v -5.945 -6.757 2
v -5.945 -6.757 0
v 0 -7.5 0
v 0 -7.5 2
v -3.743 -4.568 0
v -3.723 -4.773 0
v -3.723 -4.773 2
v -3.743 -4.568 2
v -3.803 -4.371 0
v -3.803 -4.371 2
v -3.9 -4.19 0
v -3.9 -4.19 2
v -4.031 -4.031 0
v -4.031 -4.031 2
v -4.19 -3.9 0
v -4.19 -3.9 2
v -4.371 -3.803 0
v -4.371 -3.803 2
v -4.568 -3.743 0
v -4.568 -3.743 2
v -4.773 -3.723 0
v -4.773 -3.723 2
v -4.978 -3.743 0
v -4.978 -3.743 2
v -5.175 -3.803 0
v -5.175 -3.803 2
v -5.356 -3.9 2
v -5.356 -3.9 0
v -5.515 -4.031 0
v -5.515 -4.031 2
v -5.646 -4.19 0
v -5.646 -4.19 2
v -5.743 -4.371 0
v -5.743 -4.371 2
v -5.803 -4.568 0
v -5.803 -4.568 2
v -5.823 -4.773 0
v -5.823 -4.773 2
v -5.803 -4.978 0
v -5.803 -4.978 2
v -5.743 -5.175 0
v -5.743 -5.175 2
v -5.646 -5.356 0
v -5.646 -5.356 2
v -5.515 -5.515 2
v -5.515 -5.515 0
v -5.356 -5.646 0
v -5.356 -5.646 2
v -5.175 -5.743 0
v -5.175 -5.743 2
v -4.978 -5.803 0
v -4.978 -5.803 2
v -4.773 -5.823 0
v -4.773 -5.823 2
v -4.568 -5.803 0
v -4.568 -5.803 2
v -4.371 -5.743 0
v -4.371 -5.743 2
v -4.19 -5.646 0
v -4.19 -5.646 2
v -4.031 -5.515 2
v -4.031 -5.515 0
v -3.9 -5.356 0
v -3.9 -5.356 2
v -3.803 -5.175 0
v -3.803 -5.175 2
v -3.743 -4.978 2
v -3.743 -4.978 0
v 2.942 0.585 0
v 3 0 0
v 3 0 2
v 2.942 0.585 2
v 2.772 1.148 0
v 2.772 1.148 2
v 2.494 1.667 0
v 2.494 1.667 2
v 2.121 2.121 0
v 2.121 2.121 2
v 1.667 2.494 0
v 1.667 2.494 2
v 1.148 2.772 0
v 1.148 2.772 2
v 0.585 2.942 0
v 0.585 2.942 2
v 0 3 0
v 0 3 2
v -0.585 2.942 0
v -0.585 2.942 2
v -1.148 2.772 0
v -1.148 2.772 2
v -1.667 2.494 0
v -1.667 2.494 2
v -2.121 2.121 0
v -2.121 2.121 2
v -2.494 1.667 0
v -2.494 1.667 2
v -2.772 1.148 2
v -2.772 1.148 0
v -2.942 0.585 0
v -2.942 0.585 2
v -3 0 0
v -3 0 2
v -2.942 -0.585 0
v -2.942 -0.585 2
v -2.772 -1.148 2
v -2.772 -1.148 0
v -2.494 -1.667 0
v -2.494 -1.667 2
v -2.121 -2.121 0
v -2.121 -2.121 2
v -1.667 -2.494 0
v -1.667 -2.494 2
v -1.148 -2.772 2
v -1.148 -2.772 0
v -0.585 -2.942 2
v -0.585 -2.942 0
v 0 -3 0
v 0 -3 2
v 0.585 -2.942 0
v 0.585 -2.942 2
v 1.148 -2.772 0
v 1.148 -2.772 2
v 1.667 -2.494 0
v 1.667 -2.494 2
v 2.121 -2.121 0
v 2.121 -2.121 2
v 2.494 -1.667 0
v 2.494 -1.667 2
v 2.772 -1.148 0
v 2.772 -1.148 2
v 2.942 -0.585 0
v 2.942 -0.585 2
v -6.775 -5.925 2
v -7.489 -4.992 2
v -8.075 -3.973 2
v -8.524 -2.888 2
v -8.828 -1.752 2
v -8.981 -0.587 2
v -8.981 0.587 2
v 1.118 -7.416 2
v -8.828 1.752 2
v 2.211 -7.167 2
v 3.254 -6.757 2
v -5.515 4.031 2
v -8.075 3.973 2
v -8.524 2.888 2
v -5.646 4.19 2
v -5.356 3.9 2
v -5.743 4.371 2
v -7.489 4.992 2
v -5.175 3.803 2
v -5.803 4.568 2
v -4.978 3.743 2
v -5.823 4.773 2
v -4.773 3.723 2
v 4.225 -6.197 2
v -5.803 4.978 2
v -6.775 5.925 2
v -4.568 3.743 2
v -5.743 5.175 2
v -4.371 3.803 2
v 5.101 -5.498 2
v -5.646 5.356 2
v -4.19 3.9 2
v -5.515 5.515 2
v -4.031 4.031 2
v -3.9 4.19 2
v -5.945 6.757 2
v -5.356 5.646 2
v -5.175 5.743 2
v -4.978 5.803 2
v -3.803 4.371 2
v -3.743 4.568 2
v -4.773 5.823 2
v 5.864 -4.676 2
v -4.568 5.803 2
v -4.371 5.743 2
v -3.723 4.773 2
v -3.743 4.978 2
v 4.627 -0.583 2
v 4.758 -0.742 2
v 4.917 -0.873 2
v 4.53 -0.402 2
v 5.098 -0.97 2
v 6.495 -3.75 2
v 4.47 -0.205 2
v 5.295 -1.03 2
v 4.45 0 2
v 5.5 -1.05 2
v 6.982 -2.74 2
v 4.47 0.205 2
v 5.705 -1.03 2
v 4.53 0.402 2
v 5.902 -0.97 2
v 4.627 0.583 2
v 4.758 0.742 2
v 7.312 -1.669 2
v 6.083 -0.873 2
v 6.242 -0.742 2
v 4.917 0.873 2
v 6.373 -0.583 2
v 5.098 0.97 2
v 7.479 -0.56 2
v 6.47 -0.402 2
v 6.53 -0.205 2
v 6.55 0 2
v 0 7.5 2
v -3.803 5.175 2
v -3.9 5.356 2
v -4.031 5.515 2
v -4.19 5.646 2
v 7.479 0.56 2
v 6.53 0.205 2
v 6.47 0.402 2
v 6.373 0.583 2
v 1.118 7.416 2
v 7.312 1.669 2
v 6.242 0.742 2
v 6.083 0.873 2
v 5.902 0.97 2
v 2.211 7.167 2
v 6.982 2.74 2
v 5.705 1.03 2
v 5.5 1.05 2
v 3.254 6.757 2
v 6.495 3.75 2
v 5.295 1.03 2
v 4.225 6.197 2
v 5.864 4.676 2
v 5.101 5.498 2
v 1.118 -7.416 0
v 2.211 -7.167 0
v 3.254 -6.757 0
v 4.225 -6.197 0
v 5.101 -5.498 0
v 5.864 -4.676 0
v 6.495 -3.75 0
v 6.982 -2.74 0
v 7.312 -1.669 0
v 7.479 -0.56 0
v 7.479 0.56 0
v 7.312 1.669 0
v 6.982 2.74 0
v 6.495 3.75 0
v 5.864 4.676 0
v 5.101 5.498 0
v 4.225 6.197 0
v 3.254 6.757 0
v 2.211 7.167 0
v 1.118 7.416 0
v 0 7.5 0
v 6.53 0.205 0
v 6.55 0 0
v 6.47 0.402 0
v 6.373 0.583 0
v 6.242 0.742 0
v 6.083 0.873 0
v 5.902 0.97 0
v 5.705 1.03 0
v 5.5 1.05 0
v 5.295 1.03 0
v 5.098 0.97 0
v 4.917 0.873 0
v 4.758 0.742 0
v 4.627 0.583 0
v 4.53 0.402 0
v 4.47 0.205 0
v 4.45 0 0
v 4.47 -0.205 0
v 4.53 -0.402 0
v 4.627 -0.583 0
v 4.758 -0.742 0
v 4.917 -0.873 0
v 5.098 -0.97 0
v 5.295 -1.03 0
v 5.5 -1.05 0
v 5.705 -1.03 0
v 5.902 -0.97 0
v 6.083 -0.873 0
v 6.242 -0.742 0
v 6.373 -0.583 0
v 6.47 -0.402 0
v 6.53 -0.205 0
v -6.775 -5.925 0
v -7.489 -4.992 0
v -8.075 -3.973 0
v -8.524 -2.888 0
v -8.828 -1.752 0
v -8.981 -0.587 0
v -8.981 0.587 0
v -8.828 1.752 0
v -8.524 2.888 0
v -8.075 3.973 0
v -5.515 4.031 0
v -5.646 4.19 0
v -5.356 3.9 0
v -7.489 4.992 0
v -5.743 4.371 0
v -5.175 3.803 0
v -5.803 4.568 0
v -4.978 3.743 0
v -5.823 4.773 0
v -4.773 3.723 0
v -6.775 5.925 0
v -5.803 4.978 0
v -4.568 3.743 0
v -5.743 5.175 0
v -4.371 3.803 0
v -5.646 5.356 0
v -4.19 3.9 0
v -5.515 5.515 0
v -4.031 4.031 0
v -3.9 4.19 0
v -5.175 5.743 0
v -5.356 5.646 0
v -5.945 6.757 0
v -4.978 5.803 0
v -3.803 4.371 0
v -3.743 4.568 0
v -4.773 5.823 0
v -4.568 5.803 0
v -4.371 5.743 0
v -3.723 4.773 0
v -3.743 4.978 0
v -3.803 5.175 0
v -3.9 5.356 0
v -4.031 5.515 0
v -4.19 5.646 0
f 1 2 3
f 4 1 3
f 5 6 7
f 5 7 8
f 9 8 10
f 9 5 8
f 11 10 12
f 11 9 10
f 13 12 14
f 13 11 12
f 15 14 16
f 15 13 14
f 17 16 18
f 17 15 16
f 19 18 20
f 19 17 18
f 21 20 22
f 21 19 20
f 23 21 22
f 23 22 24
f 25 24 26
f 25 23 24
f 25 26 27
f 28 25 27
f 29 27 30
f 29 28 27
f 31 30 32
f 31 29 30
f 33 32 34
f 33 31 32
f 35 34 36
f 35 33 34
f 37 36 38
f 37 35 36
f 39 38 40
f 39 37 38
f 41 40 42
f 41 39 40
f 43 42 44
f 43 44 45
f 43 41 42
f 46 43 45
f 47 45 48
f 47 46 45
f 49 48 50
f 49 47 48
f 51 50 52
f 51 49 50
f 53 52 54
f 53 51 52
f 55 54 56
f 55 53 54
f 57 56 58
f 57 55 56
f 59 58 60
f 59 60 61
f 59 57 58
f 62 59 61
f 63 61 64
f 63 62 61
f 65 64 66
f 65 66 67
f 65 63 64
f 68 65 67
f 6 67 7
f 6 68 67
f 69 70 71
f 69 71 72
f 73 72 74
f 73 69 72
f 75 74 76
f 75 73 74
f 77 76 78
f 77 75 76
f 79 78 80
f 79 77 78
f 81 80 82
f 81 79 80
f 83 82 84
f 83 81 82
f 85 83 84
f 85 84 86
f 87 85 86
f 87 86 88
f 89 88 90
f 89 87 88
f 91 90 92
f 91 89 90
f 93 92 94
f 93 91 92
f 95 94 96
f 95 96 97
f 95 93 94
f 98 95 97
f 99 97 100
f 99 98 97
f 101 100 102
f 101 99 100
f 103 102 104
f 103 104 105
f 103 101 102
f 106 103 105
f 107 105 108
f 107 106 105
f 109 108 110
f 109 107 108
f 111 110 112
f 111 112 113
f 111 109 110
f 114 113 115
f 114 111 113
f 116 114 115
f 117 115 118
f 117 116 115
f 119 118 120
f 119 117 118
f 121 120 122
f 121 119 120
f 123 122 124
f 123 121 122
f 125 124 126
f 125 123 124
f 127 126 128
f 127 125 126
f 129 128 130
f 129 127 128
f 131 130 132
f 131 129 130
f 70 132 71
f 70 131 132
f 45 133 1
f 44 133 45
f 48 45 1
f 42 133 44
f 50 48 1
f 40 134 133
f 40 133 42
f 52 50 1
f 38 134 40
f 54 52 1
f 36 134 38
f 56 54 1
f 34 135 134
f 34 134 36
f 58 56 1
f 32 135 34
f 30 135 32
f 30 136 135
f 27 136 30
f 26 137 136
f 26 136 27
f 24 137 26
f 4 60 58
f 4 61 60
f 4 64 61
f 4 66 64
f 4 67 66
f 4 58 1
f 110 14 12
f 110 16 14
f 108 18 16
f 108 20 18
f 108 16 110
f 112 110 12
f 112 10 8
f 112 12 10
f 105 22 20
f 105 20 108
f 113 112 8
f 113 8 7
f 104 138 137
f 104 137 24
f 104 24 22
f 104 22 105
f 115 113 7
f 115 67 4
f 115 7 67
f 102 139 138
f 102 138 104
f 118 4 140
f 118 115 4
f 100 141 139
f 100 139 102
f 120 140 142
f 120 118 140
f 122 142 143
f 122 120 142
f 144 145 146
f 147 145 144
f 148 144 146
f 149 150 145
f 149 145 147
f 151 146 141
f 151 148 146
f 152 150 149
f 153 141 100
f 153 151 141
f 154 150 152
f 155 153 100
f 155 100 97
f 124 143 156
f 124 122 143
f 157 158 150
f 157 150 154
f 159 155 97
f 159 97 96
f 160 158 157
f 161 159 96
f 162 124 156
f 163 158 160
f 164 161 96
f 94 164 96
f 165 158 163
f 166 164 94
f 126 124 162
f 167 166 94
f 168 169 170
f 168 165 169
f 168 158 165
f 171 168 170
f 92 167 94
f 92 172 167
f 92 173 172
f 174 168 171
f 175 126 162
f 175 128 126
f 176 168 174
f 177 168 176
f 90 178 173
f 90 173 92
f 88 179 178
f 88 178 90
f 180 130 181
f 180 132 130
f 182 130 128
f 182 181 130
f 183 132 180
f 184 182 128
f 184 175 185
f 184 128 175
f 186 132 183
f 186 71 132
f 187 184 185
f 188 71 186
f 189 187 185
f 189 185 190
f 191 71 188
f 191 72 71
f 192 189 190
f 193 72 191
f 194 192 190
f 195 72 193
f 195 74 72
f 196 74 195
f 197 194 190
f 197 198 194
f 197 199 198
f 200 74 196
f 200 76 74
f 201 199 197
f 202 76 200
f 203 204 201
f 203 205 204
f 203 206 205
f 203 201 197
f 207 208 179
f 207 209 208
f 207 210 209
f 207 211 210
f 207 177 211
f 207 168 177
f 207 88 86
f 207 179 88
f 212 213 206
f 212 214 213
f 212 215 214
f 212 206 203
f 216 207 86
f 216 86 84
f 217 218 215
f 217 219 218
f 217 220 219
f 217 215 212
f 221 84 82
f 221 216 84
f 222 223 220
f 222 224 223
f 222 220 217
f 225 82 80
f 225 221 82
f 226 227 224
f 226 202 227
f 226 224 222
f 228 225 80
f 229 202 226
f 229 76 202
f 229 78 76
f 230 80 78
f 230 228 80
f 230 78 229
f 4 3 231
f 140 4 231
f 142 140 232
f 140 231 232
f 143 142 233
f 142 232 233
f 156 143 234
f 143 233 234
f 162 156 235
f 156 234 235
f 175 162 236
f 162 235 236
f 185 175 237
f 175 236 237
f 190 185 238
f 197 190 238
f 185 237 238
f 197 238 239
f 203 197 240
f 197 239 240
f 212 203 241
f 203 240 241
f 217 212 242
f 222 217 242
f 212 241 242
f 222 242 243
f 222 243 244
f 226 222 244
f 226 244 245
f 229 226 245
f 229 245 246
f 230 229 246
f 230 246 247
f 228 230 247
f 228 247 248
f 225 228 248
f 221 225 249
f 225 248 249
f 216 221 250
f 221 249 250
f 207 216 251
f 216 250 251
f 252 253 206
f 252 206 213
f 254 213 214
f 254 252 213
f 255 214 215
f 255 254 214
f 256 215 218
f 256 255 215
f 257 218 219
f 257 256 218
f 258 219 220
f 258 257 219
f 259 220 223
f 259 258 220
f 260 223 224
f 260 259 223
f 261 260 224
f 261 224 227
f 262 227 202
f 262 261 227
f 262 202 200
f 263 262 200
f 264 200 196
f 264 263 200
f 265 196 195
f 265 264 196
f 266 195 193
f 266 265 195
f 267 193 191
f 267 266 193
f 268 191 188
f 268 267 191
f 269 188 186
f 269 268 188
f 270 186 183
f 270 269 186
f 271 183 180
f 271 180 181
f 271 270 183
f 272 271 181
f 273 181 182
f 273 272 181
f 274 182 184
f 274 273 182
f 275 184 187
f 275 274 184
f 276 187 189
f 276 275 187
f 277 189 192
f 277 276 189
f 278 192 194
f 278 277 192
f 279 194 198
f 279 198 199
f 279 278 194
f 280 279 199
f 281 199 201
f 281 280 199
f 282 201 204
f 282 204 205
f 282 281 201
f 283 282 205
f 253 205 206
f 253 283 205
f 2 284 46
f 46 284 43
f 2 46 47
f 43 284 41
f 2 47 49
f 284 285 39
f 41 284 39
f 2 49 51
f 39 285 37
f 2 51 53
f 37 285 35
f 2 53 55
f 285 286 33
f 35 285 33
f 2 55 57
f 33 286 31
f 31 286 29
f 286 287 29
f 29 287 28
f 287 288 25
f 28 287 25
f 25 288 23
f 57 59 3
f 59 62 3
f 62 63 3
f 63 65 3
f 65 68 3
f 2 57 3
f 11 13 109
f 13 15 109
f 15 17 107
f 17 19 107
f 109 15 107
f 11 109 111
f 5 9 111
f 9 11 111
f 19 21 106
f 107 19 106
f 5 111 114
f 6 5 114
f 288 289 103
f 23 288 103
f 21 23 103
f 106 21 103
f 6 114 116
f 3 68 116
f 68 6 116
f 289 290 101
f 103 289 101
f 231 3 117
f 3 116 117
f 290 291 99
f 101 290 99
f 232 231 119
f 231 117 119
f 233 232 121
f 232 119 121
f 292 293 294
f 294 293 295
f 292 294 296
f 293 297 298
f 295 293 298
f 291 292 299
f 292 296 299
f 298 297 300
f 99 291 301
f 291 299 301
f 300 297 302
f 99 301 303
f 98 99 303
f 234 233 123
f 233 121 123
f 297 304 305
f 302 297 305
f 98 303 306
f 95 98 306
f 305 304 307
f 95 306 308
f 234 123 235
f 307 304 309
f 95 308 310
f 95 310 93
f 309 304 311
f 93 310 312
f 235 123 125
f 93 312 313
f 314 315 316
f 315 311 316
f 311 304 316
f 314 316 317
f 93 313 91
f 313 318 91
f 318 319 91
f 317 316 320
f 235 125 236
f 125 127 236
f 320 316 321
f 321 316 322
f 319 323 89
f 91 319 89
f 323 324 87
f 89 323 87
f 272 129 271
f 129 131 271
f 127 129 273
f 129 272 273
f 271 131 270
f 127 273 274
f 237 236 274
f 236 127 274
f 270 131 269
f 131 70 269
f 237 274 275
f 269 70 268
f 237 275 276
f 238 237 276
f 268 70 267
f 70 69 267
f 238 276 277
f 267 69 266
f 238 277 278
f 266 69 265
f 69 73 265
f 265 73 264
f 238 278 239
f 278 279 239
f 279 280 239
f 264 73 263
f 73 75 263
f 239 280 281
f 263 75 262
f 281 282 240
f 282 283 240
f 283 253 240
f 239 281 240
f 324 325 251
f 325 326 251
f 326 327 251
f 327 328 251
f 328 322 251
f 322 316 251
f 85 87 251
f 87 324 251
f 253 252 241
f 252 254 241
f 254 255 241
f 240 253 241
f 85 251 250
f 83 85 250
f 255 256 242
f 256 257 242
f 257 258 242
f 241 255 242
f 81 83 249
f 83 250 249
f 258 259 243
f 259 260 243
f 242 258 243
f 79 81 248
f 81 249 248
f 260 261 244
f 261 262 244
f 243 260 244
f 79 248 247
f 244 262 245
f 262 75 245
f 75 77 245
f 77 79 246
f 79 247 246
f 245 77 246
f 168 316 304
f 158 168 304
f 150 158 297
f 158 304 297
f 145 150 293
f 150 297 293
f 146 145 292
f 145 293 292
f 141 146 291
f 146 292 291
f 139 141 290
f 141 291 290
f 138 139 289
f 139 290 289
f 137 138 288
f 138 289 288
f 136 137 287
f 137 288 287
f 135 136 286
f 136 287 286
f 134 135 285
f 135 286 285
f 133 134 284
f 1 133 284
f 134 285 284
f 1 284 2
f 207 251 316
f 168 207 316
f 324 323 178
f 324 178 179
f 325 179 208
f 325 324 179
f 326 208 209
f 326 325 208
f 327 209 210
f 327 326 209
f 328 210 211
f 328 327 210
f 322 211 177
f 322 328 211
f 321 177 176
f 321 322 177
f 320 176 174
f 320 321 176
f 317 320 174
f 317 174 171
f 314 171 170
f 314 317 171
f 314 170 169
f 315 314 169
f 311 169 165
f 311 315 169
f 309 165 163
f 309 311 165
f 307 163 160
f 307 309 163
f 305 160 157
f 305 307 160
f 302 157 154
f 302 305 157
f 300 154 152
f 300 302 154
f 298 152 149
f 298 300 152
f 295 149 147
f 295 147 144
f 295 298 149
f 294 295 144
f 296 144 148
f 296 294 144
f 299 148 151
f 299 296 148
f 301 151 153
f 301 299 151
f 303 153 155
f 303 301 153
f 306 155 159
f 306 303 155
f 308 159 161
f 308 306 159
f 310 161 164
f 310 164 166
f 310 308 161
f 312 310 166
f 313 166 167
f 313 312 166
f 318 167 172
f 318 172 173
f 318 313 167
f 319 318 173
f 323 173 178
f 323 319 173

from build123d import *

# Parameters (mm, degrees)
ESQUISSE1_R        = 1.05
ESQUISSE1_R_2      = 3
BOSS_EXTRU_1_DEPTH = 2


with BuildPart() as part:
    # Esquisse1 → Boss.-Extru.1 (new body)
    with BuildSketch(Plane.XY):
        with BuildLine():
            ThreePointArc((-5.945158342, 6.756855207), (-9, 0), (-5.945158342, -6.756855207))
            Line((-5.945158342, -6.756855207), (0, -7.5))
            ThreePointArc((0, -7.5), (7.5, 0), (0, 7.5))
            Line((0, 7.5), (-5.945158342, 6.756855207))
        make_face()
        with Locations((-4.772970773, 4.772970773)):
            Circle(ESQUISSE1_R, mode=Mode.SUBTRACT)
        with Locations((-4.772970773, -4.772970773)):
            Circle(ESQUISSE1_R, mode=Mode.SUBTRACT)
        Circle(ESQUISSE1_R_2, mode=Mode.SUBTRACT)
        with Locations((5.5, 0)):
            Circle(ESQUISSE1_R, mode=Mode.SUBTRACT)
    extrude(amount=BOSS_EXTRU_1_DEPTH)


solid = part.part
